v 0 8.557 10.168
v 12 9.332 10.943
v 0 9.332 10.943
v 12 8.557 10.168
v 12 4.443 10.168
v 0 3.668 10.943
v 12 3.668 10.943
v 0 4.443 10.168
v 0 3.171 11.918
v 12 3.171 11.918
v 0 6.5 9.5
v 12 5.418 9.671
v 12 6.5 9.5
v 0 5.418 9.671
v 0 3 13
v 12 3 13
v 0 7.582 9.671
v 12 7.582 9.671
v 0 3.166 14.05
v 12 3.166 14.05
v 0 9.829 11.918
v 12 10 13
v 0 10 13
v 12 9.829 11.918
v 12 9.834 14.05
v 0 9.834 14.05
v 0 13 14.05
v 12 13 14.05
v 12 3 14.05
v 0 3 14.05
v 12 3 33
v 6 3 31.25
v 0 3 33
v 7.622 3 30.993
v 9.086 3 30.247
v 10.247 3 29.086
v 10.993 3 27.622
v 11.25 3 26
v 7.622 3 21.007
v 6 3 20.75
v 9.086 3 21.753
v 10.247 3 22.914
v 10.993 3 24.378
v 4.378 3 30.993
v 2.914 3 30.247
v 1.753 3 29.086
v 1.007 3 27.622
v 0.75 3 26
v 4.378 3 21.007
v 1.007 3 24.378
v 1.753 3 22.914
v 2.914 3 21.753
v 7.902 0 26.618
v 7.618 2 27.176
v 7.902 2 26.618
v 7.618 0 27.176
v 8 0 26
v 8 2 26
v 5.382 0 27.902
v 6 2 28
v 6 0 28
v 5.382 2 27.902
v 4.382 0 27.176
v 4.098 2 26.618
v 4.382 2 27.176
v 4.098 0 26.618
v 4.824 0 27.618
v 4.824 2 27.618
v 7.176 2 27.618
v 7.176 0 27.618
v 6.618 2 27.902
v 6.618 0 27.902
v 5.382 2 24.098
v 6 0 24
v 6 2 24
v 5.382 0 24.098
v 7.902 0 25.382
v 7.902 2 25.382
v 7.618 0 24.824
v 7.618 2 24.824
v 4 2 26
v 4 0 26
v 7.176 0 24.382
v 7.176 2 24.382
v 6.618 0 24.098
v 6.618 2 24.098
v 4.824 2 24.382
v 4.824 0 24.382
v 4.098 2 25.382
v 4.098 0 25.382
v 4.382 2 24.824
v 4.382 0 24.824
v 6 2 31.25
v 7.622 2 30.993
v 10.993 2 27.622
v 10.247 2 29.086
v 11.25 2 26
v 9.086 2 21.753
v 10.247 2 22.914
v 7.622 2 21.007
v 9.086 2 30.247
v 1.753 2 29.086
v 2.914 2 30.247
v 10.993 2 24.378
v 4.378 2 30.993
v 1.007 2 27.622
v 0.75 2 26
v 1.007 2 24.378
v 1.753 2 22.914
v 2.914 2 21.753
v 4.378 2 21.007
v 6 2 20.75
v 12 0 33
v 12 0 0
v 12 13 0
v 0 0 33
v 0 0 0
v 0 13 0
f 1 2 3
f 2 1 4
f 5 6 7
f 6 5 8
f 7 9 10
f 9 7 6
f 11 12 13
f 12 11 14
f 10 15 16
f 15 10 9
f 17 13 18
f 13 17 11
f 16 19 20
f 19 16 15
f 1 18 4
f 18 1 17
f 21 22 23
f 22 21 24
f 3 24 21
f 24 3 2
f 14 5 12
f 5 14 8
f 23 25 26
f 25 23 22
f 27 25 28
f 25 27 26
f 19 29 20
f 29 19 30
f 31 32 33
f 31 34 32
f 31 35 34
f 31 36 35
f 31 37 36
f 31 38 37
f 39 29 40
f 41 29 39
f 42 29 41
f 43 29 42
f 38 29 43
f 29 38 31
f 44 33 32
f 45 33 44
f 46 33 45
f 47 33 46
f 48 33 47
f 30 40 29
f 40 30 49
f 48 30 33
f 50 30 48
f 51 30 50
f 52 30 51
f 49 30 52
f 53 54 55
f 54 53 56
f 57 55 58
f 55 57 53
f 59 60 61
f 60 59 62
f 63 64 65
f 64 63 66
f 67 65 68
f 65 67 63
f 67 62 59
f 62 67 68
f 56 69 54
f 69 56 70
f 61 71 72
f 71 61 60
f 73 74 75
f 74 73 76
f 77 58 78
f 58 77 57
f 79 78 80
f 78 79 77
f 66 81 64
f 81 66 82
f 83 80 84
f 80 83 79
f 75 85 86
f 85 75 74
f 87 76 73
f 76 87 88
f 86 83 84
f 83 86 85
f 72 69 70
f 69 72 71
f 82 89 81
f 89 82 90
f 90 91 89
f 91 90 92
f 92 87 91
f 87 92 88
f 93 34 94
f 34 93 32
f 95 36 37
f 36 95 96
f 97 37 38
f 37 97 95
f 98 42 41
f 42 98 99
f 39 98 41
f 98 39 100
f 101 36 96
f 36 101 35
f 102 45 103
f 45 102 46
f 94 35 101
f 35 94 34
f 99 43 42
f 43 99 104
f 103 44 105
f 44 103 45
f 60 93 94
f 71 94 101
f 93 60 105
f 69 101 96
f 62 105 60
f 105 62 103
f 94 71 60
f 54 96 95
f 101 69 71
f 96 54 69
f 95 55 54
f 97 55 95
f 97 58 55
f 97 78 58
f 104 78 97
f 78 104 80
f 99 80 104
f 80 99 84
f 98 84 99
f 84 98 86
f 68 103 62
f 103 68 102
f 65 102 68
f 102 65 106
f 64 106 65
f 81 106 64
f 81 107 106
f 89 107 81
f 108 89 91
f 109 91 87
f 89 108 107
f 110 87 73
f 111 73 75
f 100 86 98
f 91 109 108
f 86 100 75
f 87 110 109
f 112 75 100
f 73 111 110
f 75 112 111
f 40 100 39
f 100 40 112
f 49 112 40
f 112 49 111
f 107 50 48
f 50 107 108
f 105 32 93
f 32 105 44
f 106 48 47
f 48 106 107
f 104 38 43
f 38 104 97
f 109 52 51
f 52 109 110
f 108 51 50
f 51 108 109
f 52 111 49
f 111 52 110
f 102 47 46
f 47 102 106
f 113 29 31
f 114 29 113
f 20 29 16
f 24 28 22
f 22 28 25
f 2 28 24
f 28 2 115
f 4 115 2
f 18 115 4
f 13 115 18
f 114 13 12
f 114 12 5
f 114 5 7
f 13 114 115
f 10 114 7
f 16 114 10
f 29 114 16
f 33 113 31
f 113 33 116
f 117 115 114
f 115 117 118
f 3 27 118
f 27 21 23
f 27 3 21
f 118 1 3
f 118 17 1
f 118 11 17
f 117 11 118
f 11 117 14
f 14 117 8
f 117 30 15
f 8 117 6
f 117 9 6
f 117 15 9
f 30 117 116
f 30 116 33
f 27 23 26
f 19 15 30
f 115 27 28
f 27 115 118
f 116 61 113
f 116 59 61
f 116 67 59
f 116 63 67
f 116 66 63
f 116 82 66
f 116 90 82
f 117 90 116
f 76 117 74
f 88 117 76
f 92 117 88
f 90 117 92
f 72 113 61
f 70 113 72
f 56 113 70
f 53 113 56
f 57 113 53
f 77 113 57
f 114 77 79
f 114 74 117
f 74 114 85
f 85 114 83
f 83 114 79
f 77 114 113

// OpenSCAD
// Wire Shelf Hooks
//
// Hooks to hold the wire shelf. Mounted to the wall with screws.
//
// Daniel Winker, January 30, 2022

w = 12;  // Width
h = 33;  // Height
d = 13;  // Depth
t = 3;  // Thickness of the hook between shelf and wall

sd = 4;  // Screw diameter
shd = 10.5;  // Screw head diameter
shr = 1;  // Screw head recess
wd = 7;  // Wire diameter (i.e. diameter of what this latches onto)
sh = 26;  // Screw height (from bottom)
wh = 13;  // Wire height (from bottom)

difference() {
    // Large block to 'carve' the hook out of
    cube([w, d, h]);
    
    union(){
        // Gap where the wire goes
        translate([-0.5, t+wd/2, wh]) {
            rotate([0,90,0]) {
                cylinder(d=wd, h=w+1, $fn=20);
            }
        }
            
        // Empty space above the wire
        translate([-0.5, t, wh + 0.15*wd]) {
            cube([w+1, d, h]);
        }
        
        // Screw hole
        translate([w/2, t+0.5, sh]) {
            rotate([90,0,0]) {
                cylinder(d=sd, h=t+1, $fn=20);
            }
        }
        
        // Screw head recess
        translate([w/2, t, sh]) {
            rotate([90,0,0]) {
                cylinder(d=shd, h=shr, $fn=20);
            }
        }
    }
}
